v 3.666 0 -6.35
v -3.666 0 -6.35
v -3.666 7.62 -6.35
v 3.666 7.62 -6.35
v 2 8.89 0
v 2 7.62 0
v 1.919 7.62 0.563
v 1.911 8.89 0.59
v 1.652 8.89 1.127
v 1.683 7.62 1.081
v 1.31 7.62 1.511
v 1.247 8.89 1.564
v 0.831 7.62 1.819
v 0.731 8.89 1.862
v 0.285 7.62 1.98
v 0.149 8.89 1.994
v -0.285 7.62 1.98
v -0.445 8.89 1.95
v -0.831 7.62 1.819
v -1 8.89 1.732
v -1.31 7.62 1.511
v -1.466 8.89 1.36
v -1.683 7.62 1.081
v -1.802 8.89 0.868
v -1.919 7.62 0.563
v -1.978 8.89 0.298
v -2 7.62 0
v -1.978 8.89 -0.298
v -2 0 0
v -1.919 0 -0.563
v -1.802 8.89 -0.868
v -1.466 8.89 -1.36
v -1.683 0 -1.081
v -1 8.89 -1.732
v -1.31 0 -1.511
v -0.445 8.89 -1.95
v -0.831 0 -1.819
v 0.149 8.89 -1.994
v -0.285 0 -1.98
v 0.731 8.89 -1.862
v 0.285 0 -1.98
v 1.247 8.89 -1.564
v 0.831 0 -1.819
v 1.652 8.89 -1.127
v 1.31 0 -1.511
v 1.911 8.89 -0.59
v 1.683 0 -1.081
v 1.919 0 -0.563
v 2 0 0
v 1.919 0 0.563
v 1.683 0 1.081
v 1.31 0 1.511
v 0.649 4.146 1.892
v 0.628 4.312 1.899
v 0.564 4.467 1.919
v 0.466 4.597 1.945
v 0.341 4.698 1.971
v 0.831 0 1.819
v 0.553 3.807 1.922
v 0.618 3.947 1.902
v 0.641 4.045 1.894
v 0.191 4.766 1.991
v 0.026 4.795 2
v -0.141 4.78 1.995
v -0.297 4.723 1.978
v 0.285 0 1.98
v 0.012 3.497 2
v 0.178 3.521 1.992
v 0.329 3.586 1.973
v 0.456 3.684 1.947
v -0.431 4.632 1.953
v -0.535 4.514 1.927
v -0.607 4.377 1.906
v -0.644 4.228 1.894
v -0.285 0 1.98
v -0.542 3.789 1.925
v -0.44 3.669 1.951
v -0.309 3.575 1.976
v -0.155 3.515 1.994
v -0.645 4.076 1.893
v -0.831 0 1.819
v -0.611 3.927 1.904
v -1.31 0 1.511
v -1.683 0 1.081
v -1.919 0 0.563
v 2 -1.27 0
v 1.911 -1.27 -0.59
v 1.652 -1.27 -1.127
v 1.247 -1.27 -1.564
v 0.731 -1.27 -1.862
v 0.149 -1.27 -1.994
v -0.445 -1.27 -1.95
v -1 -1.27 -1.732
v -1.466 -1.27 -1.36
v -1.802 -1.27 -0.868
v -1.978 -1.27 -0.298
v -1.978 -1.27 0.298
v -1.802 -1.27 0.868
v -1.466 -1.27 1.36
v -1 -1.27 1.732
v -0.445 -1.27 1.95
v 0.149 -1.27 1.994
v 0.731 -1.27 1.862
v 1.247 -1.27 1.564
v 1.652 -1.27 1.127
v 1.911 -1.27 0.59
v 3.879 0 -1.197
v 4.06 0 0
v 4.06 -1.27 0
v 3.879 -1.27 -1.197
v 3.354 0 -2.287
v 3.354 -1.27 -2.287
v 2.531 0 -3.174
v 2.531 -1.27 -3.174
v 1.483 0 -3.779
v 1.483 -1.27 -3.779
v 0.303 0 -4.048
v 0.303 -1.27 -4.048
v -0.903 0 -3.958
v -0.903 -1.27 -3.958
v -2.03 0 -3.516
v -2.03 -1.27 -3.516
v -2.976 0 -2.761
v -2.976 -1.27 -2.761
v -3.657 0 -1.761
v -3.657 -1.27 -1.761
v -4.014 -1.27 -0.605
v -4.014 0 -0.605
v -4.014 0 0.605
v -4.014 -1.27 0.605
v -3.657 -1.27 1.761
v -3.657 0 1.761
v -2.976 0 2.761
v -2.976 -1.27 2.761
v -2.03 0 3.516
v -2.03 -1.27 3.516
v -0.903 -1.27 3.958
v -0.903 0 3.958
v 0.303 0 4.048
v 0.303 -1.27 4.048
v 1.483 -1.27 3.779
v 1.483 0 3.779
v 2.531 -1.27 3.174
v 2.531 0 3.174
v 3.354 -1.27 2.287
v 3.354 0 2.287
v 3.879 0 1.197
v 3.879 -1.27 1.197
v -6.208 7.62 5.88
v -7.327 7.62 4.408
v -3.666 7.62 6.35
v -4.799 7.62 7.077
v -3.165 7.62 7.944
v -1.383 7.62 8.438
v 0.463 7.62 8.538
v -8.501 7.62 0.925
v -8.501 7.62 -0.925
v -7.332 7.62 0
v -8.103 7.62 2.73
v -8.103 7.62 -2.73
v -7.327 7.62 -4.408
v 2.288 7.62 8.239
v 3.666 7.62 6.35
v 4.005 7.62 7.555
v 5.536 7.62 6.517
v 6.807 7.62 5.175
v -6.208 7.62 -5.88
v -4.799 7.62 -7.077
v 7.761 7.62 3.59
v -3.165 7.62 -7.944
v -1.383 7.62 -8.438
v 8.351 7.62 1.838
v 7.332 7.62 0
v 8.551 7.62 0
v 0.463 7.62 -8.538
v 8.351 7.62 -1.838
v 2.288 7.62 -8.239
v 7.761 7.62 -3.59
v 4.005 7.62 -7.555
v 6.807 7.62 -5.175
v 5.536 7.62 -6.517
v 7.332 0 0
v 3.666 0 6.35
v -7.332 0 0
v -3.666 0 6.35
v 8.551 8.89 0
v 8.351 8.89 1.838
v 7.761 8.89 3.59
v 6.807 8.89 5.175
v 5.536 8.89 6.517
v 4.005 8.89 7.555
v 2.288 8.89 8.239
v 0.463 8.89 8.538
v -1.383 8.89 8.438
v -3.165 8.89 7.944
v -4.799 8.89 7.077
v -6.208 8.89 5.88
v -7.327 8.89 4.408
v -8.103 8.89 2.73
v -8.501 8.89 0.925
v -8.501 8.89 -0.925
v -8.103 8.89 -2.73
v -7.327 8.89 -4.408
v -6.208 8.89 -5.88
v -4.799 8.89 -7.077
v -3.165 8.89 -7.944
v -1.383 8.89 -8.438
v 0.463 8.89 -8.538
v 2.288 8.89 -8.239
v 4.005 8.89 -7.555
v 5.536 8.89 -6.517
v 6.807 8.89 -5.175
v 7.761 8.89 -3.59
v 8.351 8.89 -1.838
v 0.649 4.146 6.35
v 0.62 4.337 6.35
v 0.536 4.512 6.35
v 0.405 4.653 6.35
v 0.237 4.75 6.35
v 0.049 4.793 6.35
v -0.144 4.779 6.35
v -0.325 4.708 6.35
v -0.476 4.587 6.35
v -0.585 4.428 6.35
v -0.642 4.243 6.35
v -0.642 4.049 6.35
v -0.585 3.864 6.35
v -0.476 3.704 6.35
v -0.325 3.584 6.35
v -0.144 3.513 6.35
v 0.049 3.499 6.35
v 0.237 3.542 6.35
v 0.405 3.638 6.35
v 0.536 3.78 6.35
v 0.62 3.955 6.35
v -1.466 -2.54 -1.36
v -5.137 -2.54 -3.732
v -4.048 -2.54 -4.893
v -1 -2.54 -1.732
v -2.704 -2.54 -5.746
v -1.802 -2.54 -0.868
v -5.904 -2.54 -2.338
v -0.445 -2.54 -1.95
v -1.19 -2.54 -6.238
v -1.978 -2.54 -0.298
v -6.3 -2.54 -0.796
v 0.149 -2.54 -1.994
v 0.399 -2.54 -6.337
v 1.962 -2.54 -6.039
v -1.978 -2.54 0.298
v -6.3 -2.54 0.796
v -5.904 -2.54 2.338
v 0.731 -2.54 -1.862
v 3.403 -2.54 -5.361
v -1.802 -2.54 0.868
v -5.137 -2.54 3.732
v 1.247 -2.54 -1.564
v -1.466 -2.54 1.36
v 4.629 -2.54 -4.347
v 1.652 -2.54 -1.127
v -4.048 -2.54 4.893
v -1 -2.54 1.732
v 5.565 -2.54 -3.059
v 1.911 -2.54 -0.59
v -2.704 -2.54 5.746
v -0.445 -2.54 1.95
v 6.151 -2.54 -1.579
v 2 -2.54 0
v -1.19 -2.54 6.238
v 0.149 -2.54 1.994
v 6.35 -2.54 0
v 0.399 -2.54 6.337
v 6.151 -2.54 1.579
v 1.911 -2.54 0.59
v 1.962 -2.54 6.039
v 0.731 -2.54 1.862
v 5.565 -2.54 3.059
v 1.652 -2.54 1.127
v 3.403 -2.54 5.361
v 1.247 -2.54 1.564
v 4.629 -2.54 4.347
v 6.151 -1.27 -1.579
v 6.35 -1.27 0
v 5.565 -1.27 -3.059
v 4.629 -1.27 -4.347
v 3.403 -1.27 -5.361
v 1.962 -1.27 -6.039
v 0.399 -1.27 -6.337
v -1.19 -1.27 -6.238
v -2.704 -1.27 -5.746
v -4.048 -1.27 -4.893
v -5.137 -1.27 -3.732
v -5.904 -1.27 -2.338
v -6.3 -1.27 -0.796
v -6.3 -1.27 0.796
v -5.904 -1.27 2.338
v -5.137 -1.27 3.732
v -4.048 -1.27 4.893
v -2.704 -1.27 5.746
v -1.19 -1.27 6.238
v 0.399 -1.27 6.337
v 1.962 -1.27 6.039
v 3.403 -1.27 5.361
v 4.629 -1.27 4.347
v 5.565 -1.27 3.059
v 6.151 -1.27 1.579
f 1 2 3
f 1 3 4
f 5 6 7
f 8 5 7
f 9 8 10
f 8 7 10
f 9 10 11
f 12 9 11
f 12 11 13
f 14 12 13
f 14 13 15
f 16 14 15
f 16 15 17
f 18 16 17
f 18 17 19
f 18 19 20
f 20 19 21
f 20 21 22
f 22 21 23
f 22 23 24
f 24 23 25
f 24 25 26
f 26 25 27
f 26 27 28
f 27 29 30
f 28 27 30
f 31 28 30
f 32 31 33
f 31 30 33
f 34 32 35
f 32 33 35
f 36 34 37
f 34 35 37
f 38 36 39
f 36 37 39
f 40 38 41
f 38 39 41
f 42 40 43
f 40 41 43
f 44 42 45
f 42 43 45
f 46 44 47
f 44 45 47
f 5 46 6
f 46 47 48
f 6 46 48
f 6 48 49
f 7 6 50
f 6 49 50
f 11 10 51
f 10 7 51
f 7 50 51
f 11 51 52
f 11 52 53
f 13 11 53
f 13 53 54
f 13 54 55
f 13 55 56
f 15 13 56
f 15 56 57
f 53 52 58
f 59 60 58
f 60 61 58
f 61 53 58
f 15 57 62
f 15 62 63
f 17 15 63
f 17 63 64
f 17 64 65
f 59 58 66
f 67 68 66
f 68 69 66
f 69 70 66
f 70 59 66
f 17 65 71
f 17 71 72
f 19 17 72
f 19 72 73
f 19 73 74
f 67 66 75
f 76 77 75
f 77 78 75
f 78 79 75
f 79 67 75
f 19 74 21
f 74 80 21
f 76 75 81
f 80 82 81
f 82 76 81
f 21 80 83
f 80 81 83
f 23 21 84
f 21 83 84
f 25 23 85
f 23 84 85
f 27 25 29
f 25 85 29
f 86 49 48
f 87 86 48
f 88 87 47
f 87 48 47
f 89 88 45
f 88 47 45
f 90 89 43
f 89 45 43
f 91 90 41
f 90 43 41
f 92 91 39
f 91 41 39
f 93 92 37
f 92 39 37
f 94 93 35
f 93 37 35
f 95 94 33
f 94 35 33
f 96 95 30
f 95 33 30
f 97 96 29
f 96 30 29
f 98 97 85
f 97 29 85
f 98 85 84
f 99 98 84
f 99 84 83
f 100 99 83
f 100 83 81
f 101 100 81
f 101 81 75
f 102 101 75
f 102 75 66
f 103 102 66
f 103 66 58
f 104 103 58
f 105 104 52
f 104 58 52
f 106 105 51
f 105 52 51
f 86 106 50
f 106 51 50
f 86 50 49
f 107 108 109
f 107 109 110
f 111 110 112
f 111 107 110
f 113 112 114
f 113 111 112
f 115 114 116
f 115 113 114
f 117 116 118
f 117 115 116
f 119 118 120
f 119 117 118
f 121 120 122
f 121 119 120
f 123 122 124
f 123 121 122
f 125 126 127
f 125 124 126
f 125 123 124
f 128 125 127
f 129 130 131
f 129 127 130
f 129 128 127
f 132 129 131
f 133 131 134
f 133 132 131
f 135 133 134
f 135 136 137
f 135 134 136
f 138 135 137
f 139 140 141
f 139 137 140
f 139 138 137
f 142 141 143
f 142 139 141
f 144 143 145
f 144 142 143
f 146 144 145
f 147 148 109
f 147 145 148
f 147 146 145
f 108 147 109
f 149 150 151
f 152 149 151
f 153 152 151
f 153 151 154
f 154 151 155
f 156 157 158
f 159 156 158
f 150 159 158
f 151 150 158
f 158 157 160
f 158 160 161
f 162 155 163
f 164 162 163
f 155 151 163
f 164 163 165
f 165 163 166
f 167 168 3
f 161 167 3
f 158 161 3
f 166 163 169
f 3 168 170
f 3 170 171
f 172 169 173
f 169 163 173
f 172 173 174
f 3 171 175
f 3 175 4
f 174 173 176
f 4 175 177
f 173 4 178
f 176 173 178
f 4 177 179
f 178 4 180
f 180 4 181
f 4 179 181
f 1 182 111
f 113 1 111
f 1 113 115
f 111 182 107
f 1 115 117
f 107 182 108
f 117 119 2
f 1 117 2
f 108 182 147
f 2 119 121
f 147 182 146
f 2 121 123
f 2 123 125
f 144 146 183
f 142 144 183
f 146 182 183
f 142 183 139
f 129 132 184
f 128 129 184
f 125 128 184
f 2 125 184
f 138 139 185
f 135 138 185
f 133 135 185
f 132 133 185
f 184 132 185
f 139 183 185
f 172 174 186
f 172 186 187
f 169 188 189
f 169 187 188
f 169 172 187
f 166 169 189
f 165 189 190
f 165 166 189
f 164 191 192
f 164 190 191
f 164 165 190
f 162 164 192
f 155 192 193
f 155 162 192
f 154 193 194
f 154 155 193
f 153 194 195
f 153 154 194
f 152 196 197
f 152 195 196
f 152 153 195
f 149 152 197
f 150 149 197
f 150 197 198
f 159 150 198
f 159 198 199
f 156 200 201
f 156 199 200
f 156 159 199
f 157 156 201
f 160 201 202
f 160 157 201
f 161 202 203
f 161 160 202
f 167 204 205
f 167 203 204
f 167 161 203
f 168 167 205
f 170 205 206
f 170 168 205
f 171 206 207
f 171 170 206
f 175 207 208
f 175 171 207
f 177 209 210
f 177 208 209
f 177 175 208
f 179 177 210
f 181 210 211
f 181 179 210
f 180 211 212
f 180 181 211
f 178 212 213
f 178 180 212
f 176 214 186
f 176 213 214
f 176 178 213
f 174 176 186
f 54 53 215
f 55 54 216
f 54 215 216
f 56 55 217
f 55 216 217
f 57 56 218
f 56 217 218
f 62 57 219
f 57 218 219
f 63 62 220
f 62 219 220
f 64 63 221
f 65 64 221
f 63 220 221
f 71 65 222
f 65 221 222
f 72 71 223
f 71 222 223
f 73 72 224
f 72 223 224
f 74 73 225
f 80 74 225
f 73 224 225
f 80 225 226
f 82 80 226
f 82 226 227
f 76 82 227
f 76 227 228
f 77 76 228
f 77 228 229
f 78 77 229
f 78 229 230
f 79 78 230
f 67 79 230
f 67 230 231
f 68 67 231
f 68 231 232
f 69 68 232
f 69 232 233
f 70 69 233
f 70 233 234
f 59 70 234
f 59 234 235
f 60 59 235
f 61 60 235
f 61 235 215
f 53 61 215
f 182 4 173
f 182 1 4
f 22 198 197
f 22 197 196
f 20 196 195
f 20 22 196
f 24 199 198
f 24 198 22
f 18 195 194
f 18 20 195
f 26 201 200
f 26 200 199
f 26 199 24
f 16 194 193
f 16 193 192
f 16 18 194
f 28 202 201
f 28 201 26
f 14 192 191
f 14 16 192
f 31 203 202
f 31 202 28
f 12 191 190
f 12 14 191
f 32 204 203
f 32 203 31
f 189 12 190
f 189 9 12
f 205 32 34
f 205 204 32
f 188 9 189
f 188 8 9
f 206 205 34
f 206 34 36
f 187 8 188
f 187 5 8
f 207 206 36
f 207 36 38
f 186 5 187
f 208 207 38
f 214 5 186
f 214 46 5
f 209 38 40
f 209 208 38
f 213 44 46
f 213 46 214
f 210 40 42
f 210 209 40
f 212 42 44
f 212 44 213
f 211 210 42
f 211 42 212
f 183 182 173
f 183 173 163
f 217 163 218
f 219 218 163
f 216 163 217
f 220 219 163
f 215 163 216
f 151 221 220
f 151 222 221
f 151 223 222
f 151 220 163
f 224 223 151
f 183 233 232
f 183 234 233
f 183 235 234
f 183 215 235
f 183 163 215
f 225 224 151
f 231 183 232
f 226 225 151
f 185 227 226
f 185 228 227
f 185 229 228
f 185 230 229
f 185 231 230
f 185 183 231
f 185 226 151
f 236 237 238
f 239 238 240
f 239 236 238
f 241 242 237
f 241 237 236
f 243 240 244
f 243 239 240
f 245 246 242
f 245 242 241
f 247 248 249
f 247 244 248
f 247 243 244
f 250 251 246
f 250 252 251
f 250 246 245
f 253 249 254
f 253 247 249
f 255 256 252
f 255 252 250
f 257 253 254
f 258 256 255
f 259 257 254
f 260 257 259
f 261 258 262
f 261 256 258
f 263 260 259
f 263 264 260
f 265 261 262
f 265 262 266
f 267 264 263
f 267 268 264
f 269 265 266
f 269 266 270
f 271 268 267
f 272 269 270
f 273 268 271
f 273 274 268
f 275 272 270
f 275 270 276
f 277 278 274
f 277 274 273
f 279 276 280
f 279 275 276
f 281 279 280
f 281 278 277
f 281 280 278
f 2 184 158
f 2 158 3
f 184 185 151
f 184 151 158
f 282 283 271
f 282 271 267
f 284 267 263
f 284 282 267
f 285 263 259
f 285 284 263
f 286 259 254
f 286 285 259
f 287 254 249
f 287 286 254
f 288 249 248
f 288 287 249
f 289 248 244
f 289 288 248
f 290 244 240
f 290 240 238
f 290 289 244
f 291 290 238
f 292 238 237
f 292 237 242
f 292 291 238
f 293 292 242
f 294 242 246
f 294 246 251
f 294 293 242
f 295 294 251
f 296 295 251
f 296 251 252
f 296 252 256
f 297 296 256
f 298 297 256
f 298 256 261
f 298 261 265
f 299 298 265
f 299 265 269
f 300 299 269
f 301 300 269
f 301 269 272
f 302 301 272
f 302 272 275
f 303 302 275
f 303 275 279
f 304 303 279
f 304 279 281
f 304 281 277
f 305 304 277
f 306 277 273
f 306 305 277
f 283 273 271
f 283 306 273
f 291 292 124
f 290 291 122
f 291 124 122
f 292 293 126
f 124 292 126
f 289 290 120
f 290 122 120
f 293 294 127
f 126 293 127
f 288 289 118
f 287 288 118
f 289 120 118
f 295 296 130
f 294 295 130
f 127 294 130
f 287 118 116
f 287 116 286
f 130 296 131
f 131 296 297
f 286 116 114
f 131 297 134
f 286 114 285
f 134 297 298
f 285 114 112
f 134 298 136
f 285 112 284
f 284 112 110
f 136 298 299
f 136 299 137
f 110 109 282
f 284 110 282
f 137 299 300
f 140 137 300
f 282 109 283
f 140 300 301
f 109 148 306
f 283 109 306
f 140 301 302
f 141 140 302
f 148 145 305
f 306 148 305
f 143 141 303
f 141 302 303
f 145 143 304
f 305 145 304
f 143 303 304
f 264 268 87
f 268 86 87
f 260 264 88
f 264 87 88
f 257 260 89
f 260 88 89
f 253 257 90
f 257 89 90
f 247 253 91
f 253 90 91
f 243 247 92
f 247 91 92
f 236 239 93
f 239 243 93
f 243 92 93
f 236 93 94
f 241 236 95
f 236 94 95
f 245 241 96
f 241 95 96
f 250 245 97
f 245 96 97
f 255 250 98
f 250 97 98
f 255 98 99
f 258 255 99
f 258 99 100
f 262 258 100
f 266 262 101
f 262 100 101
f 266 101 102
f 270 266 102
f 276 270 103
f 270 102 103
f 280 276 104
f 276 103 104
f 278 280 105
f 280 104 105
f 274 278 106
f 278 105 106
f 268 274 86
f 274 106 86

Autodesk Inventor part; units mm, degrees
ref_plane "YZ Plane" through (0, 0, 0) normal (1, 0, 0) x (0, 1, 0)
ref_plane "XZ Plane" through (0, 0, 0) normal (0, 1, 0) x (-1, 0, 0)
ref_plane "XY Plane" through (0, 0, 0) normal (0, 0, 1) x (1, 0, 0)
sketch "Esquisse1" plane through (0, 0, 0) normal (0, 1, 0) x (-1, 0, 0)
  circle A0 centre (0, 0) radius 2
  line L0 (7.3323, 0) -> (3.6662, -6.35)
  line L1 (3.6662, -6.35) -> (-3.6662, -6.35)
  line L2 (-3.6662, -6.35) -> (-7.3323, 0)
  line L3 (-7.3323, 0) -> (-3.6662, 6.35)
  line L4 (-3.6662, 6.35) -> (3.6662, 6.35)
  line L5 (3.6662, 6.35) -> (7.3323, 0)
  dimension "d0" = 12.7
  dimension "d1" = 4
extrude "Extrusion1" add sketch "Esquisse1" along normal blind 7.62
sketch "Esquisse2" plane through (0, 7.62, 0) normal (0, 1, 0) x (1, 0, 0)
  circle A0 centre (0, 0) radius 8.5509
  circle A1 centre (0, 0) radius 2
extrude "Extrusion2" add sketch "Esquisse2" along normal blind 1.27
sketch "Esquisse3" plane through (0, 0, 0) normal (0, -1, 0) x (1, 0, 0)
  circle A0 centre (0, 0) radius 4.0595
  circle A1 centre (0, 0) radius 2
extrude "Extrusion3" add sketch "Esquisse3" along normal blind 1.27
sketch "Esquisse4" plane through (0, -1.27, 0) normal (0, -1, 0) x (1, 0, 0)
  circle A0 centre (0, 0) radius 6.35
  line L0 (7.3323, 0) -> (3.6662, 6.35) projected
  circle A1 centre (0, 0) radius 2
extrude "Extrusion4" add sketch "Esquisse4" along normal blind 1.27
sketch "Esquisse5" plane through (-3.6662, 0, 6.35) normal (0, 0, 1) x (1, 0, 0)
  circle A0 centre (3.6662, 4.1459) radius 0.6492
  point P0 (3.6662, 0)
extrude "Extrusion5" cut sketch "Esquisse5" against normal blind 6
properties part number "T40_hub_40mm_1screw"
